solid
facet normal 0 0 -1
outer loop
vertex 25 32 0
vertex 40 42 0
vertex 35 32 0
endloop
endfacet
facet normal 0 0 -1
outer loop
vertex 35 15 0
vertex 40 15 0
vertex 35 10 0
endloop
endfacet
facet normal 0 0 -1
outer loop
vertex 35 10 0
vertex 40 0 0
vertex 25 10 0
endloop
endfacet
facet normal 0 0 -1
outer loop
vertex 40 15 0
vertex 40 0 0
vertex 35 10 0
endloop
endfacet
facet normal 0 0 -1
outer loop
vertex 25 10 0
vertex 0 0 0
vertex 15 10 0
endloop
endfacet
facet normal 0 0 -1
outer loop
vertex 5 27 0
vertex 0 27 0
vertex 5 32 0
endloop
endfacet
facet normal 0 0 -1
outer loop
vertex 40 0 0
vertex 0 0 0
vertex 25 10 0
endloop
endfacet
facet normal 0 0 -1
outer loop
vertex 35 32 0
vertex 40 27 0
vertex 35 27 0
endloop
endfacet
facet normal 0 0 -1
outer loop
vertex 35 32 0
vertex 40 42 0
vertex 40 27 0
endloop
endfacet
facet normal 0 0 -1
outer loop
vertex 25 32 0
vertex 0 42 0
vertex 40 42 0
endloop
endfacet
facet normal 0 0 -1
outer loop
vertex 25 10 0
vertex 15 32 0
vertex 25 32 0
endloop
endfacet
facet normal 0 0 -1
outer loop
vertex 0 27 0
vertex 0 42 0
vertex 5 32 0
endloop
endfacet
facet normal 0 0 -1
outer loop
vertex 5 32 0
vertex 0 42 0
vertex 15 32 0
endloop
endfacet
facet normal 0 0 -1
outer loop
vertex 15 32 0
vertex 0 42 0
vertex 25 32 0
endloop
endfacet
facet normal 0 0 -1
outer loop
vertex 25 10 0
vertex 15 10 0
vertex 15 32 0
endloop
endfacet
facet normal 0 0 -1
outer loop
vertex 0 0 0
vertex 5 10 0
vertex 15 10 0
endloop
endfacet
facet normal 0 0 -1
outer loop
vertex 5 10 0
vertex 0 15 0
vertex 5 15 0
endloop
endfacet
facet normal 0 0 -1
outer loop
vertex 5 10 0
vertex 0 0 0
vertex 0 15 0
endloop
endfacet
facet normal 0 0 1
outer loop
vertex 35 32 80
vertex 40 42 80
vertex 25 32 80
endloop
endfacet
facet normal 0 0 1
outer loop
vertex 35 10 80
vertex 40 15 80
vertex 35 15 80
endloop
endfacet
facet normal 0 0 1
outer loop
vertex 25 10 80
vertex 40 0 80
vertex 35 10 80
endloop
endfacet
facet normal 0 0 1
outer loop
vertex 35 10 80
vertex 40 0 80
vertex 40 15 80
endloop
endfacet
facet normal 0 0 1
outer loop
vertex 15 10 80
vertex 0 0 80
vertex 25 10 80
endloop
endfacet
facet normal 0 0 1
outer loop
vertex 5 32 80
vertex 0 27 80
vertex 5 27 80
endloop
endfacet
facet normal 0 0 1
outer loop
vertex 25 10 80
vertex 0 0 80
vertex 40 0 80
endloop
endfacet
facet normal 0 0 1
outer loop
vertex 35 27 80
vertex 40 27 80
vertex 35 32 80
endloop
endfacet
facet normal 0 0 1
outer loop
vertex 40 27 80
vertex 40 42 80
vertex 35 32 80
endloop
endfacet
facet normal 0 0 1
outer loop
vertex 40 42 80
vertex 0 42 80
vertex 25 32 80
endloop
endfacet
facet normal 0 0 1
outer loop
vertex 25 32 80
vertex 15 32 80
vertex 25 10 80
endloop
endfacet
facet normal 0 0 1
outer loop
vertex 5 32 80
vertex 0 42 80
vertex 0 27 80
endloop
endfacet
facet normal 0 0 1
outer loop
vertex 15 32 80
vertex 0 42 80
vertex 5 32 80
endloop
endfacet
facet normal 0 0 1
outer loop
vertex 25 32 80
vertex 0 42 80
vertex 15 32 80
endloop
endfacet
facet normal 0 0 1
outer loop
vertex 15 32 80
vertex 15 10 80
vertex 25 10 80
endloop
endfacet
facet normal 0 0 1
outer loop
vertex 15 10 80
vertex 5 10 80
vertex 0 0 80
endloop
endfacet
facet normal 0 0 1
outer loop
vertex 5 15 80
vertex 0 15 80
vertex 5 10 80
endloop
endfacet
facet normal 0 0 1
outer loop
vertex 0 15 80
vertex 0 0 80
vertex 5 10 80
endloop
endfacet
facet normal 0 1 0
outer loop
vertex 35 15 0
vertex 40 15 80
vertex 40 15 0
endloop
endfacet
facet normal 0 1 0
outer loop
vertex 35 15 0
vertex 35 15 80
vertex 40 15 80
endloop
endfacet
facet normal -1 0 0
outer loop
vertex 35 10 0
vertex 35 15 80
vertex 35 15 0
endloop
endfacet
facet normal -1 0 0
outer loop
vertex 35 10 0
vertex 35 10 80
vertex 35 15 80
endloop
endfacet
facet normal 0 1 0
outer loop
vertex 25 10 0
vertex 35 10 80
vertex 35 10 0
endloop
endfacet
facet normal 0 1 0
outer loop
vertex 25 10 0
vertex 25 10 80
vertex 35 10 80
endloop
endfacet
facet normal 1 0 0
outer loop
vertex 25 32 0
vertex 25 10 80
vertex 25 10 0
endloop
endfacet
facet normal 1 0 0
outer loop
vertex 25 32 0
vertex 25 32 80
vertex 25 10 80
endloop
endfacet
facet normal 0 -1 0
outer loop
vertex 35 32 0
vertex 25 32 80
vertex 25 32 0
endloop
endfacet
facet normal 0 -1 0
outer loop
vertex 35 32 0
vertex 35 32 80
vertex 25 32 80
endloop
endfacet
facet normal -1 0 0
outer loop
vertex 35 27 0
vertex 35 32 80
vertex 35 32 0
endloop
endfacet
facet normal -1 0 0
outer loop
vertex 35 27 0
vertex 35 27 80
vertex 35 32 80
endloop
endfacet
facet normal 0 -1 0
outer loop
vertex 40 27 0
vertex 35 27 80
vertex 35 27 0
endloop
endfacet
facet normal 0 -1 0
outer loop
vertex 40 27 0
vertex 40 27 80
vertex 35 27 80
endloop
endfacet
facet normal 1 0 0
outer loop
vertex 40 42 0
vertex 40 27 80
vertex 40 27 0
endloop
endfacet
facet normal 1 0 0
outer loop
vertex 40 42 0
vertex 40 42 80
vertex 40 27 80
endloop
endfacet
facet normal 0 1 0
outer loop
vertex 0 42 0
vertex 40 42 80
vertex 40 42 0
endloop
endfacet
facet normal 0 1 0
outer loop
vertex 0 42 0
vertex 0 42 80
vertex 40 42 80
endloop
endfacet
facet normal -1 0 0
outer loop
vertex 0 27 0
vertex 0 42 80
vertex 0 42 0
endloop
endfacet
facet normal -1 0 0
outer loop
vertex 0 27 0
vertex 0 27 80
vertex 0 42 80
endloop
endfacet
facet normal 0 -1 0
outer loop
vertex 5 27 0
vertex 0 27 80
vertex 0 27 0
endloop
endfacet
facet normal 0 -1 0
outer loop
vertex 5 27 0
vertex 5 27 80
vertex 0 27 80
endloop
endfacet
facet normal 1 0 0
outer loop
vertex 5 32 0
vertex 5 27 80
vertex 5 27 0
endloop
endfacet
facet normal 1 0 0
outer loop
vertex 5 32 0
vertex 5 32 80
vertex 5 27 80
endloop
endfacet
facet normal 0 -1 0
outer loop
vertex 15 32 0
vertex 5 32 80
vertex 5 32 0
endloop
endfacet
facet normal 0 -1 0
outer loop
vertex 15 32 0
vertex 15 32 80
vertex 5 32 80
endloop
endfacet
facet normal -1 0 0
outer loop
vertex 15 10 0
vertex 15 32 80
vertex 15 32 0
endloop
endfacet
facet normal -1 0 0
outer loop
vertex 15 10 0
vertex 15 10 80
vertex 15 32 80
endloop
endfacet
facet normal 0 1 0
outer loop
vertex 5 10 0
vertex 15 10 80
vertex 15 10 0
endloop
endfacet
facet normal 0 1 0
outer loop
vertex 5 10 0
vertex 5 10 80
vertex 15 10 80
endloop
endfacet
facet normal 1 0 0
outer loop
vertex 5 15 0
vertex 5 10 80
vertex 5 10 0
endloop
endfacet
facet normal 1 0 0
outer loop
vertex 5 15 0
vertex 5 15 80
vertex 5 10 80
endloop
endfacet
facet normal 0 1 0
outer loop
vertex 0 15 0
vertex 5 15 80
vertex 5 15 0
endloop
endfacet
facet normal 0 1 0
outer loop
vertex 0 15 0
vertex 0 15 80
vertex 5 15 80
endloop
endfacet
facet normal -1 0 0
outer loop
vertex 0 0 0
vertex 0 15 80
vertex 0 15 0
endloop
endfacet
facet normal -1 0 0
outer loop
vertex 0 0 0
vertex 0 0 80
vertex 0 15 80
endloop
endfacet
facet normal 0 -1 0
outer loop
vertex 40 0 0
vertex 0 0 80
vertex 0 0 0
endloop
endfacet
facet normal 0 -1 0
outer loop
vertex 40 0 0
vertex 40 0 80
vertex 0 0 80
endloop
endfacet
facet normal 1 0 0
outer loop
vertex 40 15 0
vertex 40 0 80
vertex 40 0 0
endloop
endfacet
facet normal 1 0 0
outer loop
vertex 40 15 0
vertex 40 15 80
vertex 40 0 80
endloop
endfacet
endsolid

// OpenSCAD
$fn = 32;

// ----------------------------------------------------------------------
// T-slot rail: 40 x 42 mm section, 80 mm long
// ----------------------------------------------------------------------

// --- parameters (mm) ---
profile_height = 80;      // extrusion height
profile_points = 20;      // points of the closed outline

profile = [[0, 0], [40, 0], [40, 15], [35, 15], [35, 10], [25, 10], [25, 32], [35, 32], [35, 27], [40, 27], [40, 42], [0, 42], [0, 27], [5, 27], [5, 32], [15, 32], [15, 10], [5, 10], [5, 15], [0, 15]];  // single closed polygon, 20 points, counter clockwise

// --- the one profile operation ---
linear_extrude(height = profile_height) polygon(points = profile);
